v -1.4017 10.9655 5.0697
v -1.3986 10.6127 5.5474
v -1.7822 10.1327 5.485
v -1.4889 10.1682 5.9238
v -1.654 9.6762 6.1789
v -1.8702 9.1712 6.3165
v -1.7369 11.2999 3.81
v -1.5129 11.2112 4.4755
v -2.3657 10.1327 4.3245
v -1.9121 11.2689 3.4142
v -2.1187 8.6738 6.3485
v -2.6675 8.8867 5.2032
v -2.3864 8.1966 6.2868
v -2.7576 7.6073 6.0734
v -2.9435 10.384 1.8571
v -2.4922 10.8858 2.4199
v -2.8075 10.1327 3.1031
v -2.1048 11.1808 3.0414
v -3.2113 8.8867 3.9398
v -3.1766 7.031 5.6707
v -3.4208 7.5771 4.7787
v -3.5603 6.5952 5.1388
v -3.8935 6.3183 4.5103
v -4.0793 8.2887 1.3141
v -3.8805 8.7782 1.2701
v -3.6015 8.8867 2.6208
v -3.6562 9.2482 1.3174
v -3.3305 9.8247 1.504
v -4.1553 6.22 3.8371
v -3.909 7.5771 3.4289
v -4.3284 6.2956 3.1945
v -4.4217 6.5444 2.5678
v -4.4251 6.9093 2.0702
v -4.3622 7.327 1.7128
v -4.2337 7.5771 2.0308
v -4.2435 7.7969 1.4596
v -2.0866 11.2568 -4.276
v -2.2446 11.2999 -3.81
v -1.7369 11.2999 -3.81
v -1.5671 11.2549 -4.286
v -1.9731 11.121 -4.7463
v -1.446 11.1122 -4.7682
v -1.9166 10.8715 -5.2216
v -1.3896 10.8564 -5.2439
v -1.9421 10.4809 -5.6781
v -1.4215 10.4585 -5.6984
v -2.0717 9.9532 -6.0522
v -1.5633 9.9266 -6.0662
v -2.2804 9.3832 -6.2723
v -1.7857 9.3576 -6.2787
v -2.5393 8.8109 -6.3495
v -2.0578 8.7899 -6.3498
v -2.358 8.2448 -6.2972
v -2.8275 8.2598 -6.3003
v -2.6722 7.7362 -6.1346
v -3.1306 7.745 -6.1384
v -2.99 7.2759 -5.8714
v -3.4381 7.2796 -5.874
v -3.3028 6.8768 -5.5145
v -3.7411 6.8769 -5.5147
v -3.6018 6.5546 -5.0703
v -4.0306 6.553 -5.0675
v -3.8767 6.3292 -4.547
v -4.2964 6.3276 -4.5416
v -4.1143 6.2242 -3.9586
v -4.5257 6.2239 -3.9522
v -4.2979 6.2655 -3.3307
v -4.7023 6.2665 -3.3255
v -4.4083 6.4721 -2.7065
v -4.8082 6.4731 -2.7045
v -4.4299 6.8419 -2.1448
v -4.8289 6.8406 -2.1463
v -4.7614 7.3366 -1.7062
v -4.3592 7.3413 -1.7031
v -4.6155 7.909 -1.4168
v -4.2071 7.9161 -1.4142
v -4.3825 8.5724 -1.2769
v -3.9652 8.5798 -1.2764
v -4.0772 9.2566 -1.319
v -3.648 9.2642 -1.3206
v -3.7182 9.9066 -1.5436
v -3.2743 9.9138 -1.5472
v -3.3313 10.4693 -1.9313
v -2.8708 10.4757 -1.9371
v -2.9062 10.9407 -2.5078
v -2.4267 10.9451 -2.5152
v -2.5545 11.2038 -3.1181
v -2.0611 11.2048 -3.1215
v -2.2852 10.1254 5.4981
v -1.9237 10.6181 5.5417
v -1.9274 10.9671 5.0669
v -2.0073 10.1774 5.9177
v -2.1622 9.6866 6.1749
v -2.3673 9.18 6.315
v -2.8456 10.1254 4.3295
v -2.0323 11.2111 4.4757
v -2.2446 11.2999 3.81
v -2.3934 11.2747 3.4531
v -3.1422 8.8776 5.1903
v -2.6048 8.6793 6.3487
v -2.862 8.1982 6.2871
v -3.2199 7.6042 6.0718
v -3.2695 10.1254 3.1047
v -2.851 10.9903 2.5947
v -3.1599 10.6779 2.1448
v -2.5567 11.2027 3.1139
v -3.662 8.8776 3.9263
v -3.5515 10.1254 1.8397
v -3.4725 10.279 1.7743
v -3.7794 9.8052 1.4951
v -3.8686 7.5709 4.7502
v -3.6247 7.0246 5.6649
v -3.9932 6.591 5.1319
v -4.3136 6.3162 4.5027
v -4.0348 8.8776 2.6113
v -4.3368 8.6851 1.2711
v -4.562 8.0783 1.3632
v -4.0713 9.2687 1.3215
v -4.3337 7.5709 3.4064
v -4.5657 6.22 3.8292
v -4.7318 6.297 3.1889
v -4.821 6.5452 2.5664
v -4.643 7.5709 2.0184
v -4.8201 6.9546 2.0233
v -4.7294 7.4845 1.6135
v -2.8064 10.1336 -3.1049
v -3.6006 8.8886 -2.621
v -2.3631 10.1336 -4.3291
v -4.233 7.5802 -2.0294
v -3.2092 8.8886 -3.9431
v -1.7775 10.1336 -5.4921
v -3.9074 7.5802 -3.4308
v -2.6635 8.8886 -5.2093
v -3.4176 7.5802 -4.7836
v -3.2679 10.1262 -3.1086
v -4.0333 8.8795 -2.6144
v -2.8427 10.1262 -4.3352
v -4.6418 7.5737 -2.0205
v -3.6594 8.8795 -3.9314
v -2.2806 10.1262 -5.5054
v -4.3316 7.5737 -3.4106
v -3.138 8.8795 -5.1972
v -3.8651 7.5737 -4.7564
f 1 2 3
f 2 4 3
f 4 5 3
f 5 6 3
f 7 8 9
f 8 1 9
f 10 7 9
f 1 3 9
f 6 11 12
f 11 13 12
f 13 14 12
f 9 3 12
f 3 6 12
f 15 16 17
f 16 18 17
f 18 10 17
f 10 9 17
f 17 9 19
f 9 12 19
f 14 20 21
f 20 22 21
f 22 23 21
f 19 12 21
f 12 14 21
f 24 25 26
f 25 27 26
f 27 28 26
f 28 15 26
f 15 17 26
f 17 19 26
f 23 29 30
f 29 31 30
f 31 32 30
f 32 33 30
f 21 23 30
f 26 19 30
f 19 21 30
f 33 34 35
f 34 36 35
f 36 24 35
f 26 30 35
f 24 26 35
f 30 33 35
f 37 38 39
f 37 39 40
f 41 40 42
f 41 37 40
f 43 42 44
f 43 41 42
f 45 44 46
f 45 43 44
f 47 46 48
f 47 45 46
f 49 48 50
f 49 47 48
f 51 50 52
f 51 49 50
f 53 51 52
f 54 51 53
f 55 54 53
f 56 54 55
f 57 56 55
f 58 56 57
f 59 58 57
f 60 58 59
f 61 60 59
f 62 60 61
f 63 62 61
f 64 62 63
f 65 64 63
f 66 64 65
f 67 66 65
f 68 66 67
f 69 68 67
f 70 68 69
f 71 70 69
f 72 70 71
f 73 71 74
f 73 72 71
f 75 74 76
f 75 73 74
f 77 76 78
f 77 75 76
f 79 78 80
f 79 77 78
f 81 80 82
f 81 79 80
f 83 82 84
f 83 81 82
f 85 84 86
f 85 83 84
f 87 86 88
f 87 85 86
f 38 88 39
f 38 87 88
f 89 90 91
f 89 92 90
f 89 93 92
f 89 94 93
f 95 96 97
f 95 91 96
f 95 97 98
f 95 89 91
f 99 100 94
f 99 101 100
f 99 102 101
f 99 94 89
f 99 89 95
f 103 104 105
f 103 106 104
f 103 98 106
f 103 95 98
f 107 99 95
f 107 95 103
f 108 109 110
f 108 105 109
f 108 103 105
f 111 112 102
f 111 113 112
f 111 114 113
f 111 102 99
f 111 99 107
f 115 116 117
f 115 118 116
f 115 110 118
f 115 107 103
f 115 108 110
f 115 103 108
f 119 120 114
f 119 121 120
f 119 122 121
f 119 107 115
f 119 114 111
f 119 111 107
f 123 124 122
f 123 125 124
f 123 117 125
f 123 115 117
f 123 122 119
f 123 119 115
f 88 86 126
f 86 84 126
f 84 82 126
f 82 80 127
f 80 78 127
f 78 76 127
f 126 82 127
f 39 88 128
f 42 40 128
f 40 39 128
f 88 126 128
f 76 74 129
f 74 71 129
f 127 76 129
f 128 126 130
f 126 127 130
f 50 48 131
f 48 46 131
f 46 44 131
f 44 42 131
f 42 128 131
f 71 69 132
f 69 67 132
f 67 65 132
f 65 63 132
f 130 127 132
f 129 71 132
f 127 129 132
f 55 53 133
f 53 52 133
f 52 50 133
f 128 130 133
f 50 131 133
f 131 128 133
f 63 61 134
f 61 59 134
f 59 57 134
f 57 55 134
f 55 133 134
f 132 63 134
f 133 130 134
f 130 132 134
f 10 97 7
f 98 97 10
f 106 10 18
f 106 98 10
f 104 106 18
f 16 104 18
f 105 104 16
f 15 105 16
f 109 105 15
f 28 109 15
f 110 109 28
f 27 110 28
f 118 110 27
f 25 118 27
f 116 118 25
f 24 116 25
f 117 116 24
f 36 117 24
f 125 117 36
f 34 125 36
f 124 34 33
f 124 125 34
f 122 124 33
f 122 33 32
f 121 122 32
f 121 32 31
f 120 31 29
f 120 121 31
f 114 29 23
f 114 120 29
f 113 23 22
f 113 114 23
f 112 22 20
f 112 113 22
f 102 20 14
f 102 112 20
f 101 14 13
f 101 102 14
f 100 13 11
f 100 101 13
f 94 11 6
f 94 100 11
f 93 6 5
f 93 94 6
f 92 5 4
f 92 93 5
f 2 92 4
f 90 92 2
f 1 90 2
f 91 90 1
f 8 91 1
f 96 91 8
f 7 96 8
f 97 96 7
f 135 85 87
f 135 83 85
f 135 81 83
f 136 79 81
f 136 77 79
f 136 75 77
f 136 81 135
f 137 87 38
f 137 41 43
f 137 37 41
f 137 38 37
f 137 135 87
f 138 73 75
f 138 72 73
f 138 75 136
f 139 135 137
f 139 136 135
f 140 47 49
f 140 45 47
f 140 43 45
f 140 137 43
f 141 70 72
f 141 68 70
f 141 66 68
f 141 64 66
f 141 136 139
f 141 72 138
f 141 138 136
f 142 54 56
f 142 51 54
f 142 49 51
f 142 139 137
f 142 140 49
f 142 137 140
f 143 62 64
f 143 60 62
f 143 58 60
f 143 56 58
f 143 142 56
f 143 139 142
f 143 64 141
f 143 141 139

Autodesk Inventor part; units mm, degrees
ref_plane "XZ Plane" through (0, 0, 0) normal (0, 1, 0) x (-1, 0, 0)
ref_plane "XY Plane" through (0, 0, 0) normal (0, 0, 1) x (1, 0, 0)
sketch "Sketch1" plane through (0, 0, 0) normal (0, 0, 1) x (1, 0, 0)
  arc A0 (20.3817, 3.6799) -> (-5.0183, 3.6799) centre (7.6817, 3.6799) ccw
  line L0 (-5.0183, -9.6551) -> (-5.0183, 3.6799)
  line L1 (-5.0183, 3.6799) -> (20.3817, 3.6799) projected
  line L2 (7.6817, 3.6799) -> (7.6817, 16.3799)
  point P0 (0, 0)
ref_plane "Work Plane1" through (-5.0183, 3.6799, 0) normal (1, 0, 0) x (0, 1, 0)
sketch "Sketch2" plane through (-5.0183, 3.6799, 0) normal (1, 0, 0) x (0, 1, 0)
  arc A0 (0, -12.7) -> (0, 12.7) centre (0, 0.8576) ccw
  line L0 (0, 12.7) -> (0, -12.7) projected
  line L1 (0, 12.7) -> (0, -12.7) projected
  circle A1 centre (5.08, 3.81) radius 2.54
  line L2 (12.671, 0) -> (-9.5008, 0)
  circle A2 centre (5.08, -3.81) radius 2.54
  point P0 (-3.6799, 0)
  dimension "d1" = 5.08
  dimension "d2" = 5.08
  dimension "d3" = 8.89
extrude "Extrusion1" add sketch "Sketch2" along normal blind 5.08 contours A1 | A2
sketch "Sketch3" plane through (0, 0, 0) normal (0, 0, 1) x (1, 0, 0)
  arc A0 (20.3817, 3.6799) -> (-5.0183, 3.6799) centre (7.6817, 3.6799) ccw projected
  line L0 (-5.0183, 3.6799) -> (20.3817, 3.6799) projected
  arc A1 (20.3817, 3.6799) -> (-5.0183, 3.6799) centre (7.6817, 3.6799) ccw
  line L1 (7.6817, 3.6799) -> (7.6817, 16.3799)
  arc A2 (7.6817, 16.3799) -> (-5.0183, 3.6799) centre (7.6817, 3.6799) ccw
  line L2 (7.6817, 3.6799) -> (-5.0183, 3.6799)
  line L3 (7.6817, 16.3799) -> (7.6817, 3.6799)
  circle A3 centre (7.6817, 3.6799) radius 13.208
  line L4 (7.6817, 3.6799) -> (-5.5263, 3.6799)
  line L5 (7.6817, 3.6799) -> (7.6817, 16.8879)
  arc A4 (7.6817, 16.8879) -> (-5.5263, 3.6799) centre (7.6817, 3.6799) ccw
  point P0 (0, 0)
  dimension "d7" = 0.508
revolve "Revolution1" cut sketch "Sketch3" angle 360 about axis through (7.6817, 3.6799, 0) along (0, 1, 0) picked at (4.9029, 11.6212) contours L1 L0 A0
sketch "Sketch4" plane through (0, 0, 0) normal (0, 0, 1) x (1, 0, 0)
  arc A0 (20.3817, 3.6799) -> (-5.0183, 3.6799) centre (7.6817, 3.6799) ccw
  line L0 (7.6817, 3.6799) -> (7.6817, 16.3799)
  line L1 (7.6817, 3.6799) -> (-5.0183, 3.6799)
  circle A1 centre (7.6817, 3.6799) radius 13.081
  line L2 (7.6817, 16.7609) -> (7.6817, 3.6799)
  line L3 (7.6817, 3.6799) -> (-5.3993, 3.6799)
  arc A2 (7.6817, 16.7609) -> (-5.3993, 3.6799) centre (7.6817, 3.6799) ccw
  point P0 (0, 0)
  dimension "d8" = 0.381
revolve "Revolution2" cut sketch "Sketch4" angle 360 about axis through (7.6817, 16.7609, 0) along (0, -1, 0) keep common part contours A0 L3 A1 L2
properties part number "GhostEye"
